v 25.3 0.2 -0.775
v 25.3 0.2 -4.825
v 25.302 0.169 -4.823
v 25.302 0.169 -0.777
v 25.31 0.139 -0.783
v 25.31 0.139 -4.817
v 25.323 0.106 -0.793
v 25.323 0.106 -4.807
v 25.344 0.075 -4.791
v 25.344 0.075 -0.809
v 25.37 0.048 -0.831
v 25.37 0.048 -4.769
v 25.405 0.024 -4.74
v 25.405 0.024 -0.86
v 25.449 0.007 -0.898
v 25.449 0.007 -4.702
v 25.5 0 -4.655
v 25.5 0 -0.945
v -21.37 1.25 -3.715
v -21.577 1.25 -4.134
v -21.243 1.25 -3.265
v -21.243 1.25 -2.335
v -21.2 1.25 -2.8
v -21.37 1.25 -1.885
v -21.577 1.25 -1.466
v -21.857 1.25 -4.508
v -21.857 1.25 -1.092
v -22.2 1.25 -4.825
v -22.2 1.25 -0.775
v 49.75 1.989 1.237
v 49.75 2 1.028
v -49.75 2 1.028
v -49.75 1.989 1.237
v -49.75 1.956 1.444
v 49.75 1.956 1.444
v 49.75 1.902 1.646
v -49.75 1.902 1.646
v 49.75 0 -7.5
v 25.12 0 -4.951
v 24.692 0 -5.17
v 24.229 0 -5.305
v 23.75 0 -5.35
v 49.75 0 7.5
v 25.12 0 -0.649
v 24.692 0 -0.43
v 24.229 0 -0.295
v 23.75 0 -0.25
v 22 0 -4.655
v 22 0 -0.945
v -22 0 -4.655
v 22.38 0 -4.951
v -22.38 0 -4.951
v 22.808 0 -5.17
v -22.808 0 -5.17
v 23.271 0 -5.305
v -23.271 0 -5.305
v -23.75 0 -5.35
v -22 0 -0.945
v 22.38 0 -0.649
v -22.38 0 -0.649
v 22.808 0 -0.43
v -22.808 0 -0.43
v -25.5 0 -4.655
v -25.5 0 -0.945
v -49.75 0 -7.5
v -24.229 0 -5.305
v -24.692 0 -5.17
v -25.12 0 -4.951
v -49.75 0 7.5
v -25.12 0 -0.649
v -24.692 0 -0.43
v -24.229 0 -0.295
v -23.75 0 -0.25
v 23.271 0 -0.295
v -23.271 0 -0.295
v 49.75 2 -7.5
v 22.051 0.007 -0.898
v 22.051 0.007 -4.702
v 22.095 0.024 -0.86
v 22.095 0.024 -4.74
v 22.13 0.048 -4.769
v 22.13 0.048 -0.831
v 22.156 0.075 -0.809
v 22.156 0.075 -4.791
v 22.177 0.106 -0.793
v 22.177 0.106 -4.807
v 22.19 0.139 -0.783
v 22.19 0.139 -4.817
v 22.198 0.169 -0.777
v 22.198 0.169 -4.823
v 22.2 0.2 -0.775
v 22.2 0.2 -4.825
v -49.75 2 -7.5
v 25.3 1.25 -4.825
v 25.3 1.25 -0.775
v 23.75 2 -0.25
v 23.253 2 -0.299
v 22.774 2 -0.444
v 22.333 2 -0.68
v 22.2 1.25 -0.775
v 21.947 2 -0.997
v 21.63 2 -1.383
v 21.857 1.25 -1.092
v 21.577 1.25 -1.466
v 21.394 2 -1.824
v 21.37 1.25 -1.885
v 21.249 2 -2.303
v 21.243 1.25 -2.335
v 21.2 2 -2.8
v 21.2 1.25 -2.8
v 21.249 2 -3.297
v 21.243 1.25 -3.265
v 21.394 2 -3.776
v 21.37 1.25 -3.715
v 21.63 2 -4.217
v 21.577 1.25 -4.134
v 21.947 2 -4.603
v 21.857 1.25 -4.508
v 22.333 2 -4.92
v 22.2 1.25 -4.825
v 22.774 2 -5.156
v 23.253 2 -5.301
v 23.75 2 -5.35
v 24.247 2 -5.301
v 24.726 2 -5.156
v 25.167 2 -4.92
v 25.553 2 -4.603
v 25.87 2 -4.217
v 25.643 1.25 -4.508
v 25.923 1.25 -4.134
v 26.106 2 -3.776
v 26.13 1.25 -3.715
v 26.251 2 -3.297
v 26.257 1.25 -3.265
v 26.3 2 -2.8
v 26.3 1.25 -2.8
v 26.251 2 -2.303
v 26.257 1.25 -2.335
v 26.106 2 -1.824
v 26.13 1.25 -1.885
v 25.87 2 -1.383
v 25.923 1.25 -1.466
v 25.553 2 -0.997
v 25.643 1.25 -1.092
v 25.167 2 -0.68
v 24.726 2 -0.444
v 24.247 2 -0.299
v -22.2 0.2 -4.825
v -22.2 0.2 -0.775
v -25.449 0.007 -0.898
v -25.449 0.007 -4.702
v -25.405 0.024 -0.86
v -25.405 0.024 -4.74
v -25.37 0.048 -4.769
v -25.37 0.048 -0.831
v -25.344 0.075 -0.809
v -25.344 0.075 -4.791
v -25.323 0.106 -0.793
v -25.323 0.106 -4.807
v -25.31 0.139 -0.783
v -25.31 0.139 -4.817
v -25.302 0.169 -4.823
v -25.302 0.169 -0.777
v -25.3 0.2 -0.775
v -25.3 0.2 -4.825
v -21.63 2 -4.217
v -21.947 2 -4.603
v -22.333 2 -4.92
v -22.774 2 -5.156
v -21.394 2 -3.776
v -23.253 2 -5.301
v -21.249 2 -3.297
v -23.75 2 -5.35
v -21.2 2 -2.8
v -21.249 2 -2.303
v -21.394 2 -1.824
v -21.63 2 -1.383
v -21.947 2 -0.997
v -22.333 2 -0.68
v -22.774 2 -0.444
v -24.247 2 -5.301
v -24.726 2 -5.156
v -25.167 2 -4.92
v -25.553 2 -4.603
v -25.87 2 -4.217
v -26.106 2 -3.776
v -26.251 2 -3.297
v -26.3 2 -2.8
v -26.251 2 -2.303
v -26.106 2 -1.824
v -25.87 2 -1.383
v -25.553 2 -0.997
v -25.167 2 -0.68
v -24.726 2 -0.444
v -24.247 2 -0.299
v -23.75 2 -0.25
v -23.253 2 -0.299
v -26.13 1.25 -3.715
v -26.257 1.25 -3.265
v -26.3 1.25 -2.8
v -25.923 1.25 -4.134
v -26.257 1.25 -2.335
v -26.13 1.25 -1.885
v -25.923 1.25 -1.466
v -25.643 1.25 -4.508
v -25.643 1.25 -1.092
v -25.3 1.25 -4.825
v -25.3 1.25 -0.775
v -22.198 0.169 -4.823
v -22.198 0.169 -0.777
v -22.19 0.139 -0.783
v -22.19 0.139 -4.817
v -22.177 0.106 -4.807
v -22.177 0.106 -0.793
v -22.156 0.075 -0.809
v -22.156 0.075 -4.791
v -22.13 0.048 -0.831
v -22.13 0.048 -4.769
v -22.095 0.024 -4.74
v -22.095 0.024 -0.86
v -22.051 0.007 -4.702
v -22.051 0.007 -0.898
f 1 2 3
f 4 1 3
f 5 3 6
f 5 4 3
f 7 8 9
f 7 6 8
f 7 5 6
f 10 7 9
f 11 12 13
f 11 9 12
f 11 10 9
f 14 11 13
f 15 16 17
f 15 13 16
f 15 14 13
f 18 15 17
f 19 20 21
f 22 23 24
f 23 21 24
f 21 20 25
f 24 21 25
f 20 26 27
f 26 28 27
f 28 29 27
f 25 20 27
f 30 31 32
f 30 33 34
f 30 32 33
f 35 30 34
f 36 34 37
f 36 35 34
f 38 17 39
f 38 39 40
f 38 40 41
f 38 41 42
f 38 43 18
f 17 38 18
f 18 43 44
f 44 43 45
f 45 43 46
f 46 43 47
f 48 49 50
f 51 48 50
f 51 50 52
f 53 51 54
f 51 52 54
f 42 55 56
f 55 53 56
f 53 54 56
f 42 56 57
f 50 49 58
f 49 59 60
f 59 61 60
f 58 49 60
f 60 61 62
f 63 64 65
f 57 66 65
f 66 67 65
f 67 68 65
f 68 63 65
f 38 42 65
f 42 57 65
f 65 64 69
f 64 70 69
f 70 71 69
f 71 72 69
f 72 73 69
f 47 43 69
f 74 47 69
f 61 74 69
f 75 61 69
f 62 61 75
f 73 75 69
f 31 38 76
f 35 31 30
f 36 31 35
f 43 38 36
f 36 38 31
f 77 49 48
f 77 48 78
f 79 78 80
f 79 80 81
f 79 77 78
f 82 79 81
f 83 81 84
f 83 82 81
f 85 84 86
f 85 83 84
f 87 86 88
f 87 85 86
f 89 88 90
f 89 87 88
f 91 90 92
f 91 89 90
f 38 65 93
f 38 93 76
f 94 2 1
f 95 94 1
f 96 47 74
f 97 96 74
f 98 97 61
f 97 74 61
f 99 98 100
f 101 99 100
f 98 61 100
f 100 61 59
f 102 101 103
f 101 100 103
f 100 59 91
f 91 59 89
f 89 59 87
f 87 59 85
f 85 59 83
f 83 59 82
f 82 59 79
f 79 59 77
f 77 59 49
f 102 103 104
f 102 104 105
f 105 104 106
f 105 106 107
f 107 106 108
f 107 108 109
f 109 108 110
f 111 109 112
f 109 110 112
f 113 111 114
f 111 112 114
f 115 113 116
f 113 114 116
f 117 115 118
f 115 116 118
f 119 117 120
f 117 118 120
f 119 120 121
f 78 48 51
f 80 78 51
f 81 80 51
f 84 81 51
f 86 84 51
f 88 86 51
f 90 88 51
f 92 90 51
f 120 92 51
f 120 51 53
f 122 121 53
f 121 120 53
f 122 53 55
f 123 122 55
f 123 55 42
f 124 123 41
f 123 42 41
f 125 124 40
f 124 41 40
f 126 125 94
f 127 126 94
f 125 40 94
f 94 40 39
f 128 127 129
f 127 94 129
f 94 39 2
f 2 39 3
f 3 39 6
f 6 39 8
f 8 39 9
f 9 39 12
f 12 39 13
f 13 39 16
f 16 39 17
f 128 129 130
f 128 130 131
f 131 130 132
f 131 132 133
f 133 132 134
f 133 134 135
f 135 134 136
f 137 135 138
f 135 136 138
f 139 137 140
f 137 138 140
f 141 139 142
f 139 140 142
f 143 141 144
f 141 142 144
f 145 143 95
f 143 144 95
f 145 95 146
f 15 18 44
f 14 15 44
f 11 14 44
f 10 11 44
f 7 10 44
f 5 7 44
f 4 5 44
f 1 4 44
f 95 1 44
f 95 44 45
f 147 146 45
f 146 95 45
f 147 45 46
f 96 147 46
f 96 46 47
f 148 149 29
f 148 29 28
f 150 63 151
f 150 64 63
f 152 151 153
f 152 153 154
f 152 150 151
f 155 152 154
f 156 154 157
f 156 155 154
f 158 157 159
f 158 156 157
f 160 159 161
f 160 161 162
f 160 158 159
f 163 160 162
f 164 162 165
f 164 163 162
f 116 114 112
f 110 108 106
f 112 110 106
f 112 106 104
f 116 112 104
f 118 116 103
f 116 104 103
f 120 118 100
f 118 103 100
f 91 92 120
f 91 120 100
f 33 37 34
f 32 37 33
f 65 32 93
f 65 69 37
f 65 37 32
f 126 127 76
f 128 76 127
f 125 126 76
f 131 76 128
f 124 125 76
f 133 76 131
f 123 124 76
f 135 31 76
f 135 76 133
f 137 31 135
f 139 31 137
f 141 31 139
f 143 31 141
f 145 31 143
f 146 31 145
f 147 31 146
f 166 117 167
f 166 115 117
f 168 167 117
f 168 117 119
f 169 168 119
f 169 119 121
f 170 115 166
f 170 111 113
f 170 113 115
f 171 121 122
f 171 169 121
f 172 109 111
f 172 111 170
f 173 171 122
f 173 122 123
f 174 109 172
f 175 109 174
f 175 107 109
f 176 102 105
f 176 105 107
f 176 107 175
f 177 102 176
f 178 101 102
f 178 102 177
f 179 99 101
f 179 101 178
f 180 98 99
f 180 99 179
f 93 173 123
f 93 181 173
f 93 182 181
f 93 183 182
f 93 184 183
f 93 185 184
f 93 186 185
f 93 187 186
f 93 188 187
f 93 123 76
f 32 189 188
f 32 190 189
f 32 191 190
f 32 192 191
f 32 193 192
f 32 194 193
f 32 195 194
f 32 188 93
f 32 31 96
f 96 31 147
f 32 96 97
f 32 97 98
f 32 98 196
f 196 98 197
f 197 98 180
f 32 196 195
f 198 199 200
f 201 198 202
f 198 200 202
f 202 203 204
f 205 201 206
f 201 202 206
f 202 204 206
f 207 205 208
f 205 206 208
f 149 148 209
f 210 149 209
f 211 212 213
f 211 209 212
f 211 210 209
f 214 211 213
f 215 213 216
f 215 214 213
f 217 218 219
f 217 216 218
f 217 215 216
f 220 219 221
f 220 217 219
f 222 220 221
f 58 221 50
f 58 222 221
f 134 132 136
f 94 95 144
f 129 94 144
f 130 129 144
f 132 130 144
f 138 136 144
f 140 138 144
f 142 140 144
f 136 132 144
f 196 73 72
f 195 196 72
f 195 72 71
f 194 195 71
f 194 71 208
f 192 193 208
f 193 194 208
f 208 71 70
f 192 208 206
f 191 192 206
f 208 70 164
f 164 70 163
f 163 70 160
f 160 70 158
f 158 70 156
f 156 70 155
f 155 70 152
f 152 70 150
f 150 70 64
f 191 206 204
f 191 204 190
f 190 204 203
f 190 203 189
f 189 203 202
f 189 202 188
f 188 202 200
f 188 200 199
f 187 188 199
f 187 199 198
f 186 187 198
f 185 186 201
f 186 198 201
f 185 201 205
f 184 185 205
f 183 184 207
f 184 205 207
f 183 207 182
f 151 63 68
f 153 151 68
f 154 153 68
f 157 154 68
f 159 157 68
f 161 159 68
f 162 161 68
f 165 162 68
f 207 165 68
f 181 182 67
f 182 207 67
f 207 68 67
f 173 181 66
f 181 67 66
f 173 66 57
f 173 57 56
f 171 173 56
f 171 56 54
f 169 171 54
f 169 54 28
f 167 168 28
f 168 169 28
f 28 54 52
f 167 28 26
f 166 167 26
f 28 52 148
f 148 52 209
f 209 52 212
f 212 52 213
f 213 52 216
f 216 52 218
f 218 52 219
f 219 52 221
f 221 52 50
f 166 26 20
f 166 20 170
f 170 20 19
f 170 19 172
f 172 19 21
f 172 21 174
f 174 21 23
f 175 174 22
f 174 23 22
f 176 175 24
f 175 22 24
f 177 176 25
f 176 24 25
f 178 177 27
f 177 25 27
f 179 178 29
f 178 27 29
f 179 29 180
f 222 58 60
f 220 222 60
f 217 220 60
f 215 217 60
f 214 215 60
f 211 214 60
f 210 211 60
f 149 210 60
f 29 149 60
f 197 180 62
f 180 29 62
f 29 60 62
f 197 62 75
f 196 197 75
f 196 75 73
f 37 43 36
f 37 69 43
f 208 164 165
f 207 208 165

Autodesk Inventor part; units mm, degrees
ref_plane "YZ Plane" through (0, 0, 0) normal (1, 0, 0) x (0, 1, 0)
ref_plane "XZ Plane" through (0, 0, 0) normal (0, 1, 0) x (-1, 0, 0)
sketch "Sketch1" plane through (0, 0, 0) normal (0, 1, 0) x (-1, 0, 0)
  line L0 (-49.75, 7.5) -> (49.75, 7.5)
  line L1 (49.75, 7.5) -> (49.75, -7.5)
  line L2 (49.75, -7.5) -> (-49.75, -7.5)
  line L3 (-49.75, -7.5) -> (-49.75, 7.5)
  line L4 (-49.75, 7.5) -> (49.75, -7.5) construction
  line L5 (49.75, 7.5) -> (-49.75, -7.5) construction
  point P0 (0, 0)
  dimension "d0" = 15
  dimension "d1" = 99.5
extrude "Extrusion1" add sketch "Sketch1" along normal blind 2
sketch "Sketch2" plane through (0, 2, 0) normal (0, 1, 0) x (1, 0, 0)
  line L0 (49.75, 7.5) -> (-49.75, 7.5) projected
  line L1 (49.75, -7.5) -> (49.75, 7.5) projected
  point P0 (0, 0)
  point P1 (23.75, 2.8)
  dimension "d11" = 4.7
  dimension "d12" = 26
hole "Hole1" at (23.75, 2, -2.8) direction (0, -1, 0) diameter 5.1 end through all
sketch "Sketch3" plane through (0, 0, 0) normal (0, -1, 0) x (1, 0, 0)
  line L0 (26.3, -0.25) -> (21.2, -0.25)
  line L1 (21.2, -0.25) -> (21.2, -5.35)
  line L2 (21.2, -5.35) -> (26.3, -5.35)
  line L3 (26.3, -5.35) -> (26.3, -0.25)
  circle A0 centre (23.75, -2.8) radius 2.55 projected
  line L4 (26.3, -0.25) -> (21.2, -5.35) construction
  line L5 (21.2, -0.25) -> (26.3, -5.35) construction
  line L6 (25.3, -5.35) -> (25.3, -0.25)
  line L7 (22.2, -5.35) -> (22.2, -0.25)
  point P0 (0, 0)
  point P1 (22.2, -4.8248)
  point P2 (22.2, -0.7752)
  point P3 (25.3, -0.7752)
  point P4 (25.3, -4.8248)
  dimension "d13" = 5.1
  dimension "d14" = 5.1
  dimension "d15" = 1
  dimension "d16" = 1
extrude "Extrusion2" add sketch "Sketch3" against normal blind 1.25 contours A0 L6 | L7 A0
fillet "Fillet1" radius 0.2 2 edges at (25.3, 0, -2.8) (22.2, 0, -2.8)
ref_plane "Work Plane1" through (0, 0, -7.5) normal (-1, 0, 0) x (0, 0, 1)
mirror "Mirror1" about plane through (0, 0, -7.5) normal (-1, 0, 0) of "Hole1", "Extrusion2", "Fillet1"
sketch "Sketch4" plane through (-49.75, 0, -7.5) normal (-1, 0, 0) x (0, 0, 1)
  line L0 (0, 0) -> (15, 0) projected
  line L1 (15, 0) -> (8.8446, 2)
  line L2 (0, 2) -> (15, 2) projected
  line L3 (8.8446, 0) -> (15, 0)
  line L4 (8.8446, 2) -> (8.8446, 0)
  line L5 (15, 0) -> (15, 2) projected
  line L6 (8.8446, 2) -> (15, 2)
  line L7 (15, 2) -> (15, 0)
  point P0 (7.5, 0)
  dimension "d21" = 18
extrude "Extrusion3" cut sketch "Sketch4" against normal through all contours L1 L2 L5
fillet "Fillet2" radius 2 1 edges at (0, 2, 1.3446)
properties part number "Bladev2" material "Stainless Steel"
